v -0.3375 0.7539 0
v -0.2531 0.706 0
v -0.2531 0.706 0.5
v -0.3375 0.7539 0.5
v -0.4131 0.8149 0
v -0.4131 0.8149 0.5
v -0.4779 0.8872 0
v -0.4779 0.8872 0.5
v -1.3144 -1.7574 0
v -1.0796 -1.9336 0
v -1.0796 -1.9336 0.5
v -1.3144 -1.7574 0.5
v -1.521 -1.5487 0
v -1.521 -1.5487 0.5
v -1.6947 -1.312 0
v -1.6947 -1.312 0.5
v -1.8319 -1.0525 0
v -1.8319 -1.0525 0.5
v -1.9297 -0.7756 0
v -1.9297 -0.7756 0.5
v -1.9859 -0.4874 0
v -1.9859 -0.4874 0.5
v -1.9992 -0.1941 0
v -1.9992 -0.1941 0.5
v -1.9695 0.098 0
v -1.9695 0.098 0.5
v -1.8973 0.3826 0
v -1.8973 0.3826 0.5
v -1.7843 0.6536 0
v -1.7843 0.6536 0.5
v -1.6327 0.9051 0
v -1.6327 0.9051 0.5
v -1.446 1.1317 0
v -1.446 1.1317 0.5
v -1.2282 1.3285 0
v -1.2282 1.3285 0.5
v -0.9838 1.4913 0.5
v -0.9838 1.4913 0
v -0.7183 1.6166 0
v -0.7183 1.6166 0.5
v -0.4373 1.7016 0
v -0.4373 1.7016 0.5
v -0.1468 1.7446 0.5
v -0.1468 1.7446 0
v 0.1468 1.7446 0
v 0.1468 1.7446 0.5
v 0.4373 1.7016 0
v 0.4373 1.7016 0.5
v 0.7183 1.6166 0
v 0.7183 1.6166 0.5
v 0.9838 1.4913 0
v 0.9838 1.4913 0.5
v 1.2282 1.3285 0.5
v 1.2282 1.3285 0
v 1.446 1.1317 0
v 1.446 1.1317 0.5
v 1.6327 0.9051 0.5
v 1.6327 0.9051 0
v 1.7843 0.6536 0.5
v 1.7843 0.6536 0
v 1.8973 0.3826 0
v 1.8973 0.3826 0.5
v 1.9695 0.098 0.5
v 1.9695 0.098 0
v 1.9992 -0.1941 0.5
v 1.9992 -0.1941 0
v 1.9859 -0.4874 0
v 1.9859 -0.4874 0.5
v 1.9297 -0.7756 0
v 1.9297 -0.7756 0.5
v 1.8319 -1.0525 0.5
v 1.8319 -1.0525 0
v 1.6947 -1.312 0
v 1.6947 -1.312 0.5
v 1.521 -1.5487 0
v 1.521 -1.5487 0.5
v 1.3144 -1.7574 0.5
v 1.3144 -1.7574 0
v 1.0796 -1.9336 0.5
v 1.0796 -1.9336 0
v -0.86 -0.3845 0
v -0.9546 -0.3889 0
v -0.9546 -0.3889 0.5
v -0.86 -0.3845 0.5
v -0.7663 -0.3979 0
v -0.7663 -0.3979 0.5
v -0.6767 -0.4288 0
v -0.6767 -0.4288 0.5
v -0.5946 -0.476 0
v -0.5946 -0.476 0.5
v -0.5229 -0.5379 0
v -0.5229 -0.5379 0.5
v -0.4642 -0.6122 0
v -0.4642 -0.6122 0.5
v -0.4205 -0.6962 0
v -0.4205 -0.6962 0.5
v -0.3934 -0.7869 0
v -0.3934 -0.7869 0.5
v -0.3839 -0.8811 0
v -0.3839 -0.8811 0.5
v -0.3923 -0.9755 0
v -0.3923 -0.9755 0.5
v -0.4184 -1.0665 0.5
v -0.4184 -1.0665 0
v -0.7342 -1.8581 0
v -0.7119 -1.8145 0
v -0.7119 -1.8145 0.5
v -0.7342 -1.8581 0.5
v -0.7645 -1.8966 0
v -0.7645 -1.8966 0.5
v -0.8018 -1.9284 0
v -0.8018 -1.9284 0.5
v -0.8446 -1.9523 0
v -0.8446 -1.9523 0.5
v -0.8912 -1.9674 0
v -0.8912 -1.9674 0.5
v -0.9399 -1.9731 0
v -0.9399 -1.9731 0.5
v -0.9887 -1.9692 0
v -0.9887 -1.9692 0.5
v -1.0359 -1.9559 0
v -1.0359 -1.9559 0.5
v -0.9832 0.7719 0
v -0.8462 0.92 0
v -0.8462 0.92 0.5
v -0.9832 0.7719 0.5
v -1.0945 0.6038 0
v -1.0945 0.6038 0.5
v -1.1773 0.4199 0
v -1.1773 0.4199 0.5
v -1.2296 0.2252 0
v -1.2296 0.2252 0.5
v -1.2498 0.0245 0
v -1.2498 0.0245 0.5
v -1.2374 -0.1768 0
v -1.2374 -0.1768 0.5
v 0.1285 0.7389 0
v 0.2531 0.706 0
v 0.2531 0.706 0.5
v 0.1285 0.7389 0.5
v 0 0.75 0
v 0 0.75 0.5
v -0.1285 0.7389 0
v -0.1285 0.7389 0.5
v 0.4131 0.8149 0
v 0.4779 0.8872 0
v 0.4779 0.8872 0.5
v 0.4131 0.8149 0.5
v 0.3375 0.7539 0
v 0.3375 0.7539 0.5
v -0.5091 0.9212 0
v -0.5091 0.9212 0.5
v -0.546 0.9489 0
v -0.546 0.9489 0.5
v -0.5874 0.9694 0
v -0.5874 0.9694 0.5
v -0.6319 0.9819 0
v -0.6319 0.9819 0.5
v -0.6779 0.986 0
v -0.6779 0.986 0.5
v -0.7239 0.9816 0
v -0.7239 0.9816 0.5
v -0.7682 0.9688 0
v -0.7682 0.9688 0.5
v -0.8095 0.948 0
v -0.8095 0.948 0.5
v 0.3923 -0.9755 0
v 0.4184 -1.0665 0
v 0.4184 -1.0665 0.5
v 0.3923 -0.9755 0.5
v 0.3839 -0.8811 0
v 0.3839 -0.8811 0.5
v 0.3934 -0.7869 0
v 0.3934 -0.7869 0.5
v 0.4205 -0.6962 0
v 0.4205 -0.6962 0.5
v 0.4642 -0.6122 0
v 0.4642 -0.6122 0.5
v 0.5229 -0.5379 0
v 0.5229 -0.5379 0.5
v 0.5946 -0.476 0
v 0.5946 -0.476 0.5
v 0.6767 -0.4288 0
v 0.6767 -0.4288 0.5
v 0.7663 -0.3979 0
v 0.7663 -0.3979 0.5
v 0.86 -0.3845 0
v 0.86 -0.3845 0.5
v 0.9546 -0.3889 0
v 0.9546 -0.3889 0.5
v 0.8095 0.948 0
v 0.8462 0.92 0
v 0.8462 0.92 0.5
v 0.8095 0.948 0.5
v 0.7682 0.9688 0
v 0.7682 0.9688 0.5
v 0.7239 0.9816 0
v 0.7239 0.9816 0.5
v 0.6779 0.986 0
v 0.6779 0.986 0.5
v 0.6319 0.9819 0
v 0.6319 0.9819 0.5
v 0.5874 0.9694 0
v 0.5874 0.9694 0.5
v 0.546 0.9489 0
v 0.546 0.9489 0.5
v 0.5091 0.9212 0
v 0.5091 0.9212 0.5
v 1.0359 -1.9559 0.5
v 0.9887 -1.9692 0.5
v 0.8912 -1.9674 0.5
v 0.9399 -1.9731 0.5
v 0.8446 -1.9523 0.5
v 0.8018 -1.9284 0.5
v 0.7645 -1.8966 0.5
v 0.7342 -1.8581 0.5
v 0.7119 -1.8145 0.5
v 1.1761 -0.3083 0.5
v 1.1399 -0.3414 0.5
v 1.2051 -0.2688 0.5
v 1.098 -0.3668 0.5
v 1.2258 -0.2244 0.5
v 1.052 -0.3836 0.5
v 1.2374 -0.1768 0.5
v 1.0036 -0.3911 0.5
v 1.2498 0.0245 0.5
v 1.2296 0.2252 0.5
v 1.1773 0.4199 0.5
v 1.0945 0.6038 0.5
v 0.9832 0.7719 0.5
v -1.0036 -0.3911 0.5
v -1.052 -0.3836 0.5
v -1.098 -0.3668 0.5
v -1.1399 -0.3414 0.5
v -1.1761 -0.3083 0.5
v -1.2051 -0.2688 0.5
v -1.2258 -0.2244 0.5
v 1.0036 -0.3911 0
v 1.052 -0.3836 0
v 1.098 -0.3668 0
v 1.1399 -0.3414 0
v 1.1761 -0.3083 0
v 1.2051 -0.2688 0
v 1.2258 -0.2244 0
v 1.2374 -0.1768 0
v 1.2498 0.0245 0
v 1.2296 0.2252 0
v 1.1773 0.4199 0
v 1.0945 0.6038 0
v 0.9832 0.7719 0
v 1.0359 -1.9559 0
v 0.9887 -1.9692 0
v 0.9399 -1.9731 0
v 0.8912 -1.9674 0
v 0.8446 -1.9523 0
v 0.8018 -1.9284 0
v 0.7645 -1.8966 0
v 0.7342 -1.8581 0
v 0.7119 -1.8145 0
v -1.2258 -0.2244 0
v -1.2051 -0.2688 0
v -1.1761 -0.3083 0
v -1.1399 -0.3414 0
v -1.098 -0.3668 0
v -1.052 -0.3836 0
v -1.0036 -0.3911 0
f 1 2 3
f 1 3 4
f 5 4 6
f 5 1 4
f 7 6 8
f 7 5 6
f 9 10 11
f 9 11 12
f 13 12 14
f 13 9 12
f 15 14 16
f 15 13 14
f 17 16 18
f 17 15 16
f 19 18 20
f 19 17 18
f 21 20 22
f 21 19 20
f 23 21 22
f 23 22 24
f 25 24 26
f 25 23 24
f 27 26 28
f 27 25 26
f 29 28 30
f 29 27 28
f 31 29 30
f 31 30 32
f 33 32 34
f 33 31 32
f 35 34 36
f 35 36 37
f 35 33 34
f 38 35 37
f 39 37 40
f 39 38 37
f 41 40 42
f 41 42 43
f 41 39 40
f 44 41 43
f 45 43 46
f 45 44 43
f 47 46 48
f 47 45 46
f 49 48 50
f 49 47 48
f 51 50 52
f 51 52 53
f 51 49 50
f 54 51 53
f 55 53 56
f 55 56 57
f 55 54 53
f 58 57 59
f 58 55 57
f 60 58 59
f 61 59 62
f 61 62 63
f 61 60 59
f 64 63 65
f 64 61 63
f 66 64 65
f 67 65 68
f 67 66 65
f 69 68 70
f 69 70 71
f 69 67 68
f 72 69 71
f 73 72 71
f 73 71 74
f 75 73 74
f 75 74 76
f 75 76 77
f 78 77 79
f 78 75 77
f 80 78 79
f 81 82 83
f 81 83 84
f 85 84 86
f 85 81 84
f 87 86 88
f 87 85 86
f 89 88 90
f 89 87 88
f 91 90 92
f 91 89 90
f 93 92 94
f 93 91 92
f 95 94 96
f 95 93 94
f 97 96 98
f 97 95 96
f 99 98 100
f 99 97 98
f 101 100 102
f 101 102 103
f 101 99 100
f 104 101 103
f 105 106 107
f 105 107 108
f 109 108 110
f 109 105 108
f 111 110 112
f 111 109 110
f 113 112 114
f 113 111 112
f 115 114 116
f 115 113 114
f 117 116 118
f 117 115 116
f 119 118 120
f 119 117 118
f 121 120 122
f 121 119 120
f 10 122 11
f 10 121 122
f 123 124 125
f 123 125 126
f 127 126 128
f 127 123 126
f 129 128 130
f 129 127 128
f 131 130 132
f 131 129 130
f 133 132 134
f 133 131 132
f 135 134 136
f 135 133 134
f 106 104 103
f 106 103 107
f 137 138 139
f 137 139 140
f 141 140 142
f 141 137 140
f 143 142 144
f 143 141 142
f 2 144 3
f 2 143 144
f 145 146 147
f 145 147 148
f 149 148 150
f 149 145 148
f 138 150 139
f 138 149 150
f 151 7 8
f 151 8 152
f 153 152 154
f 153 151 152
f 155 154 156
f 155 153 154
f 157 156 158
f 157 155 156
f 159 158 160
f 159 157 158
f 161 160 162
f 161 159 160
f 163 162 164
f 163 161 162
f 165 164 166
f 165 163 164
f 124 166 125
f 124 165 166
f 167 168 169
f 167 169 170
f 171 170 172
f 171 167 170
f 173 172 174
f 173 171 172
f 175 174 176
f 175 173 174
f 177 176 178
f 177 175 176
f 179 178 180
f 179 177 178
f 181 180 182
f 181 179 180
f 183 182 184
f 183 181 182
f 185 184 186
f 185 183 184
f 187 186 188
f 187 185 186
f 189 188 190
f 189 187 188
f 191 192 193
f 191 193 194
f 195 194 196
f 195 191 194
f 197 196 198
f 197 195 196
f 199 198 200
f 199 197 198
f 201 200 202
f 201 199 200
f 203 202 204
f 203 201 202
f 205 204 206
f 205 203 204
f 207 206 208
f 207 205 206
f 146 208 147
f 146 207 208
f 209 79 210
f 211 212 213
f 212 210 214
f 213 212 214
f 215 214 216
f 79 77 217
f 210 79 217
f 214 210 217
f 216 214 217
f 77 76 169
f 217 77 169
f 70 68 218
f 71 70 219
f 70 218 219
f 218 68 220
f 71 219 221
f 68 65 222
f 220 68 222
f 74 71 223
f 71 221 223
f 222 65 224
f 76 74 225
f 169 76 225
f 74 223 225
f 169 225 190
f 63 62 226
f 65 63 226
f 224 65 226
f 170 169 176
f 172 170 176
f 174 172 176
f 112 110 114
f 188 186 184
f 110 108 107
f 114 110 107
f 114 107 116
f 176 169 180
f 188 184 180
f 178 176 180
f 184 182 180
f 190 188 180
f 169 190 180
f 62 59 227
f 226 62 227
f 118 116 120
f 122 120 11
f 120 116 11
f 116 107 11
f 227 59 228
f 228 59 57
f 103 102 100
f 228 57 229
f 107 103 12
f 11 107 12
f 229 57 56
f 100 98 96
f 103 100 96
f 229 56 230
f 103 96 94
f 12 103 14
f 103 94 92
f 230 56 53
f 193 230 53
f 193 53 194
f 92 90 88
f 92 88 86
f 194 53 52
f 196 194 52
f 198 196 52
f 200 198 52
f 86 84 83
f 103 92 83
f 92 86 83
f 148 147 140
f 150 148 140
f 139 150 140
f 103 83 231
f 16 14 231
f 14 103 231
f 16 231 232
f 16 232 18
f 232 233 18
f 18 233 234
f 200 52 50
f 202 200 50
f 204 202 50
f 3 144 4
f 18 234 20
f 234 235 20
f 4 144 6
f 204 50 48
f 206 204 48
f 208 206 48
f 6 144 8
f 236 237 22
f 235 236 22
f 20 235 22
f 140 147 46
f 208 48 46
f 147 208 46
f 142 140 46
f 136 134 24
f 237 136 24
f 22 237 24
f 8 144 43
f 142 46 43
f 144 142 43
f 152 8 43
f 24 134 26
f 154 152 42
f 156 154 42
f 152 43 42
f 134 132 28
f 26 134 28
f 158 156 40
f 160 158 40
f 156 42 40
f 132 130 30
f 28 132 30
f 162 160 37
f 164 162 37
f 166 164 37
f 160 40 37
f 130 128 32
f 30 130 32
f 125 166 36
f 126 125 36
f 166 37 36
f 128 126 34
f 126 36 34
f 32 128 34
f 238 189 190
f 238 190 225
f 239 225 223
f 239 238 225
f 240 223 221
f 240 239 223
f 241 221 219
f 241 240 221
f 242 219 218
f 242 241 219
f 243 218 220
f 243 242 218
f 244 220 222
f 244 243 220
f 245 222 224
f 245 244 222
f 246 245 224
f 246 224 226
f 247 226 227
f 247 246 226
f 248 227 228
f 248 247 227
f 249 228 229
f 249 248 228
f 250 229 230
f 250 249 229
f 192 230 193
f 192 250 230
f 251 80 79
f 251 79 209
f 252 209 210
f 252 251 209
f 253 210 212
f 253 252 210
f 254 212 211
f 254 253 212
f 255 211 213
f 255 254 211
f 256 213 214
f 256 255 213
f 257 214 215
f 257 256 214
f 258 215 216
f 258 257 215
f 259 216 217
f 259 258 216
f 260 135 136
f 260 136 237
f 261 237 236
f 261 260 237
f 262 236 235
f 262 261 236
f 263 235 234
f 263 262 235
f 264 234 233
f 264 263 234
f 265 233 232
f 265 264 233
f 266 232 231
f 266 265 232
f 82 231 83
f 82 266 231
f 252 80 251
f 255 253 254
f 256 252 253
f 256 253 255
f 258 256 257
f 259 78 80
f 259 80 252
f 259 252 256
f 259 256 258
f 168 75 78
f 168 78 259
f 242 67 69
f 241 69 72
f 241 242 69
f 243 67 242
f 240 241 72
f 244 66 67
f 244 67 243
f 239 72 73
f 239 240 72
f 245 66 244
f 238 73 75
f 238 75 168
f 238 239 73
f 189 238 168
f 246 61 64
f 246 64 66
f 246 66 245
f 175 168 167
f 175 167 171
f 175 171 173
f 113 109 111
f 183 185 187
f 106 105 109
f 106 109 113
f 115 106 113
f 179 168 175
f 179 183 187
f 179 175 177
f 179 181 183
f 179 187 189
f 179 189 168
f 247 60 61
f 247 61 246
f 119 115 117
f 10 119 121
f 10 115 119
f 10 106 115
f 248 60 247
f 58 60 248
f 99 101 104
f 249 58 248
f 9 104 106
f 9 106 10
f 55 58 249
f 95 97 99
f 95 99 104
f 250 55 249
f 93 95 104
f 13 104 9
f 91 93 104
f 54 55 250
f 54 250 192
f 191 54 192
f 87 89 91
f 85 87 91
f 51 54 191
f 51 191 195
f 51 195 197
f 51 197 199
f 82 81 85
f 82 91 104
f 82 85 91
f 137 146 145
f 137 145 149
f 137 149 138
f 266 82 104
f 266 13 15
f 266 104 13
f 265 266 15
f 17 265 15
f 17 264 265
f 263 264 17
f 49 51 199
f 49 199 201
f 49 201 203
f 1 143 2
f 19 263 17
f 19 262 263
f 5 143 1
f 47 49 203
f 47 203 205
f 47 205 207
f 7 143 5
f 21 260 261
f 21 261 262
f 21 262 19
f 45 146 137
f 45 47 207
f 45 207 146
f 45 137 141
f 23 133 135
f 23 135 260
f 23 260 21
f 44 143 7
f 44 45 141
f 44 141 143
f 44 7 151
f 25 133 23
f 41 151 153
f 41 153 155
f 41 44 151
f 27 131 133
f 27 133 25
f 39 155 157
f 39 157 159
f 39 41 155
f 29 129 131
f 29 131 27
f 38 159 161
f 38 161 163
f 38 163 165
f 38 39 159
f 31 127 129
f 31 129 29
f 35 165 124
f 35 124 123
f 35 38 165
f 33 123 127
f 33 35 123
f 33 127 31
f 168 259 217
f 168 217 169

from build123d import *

# Parameters (mm, degrees)
BOSS_EXTRU_1_DEPTH = 0.5


with BuildPart() as part:
    # Esquisse1 → Boss.-Extru.1 (new body)
    with BuildSketch(Plane.XY):
        with BuildLine():
            Line((-0.418425085, -1.066499155), (-0.711880974, -1.814471655))
            ThreePointArc((-0.711880974, -1.814471655), (-0.867543301, -1.960988747), (-1.079554479, -1.933615789))
            ThreePointArc((-1.079554479, -1.933615789), (0, 1.75), (1.079554479, -1.933615789))
            ThreePointArc((1.079554479, -1.933615789), (0.867543301, -1.960988747), (0.711880974, -1.814471655))
            Line((0.711880974, -1.814471655), (0.418425085, -1.066499155))
            ThreePointArc((0.418425085, -1.066499155), (0.49178829, -0.57362332), (0.954594155, -0.38890873))
            ThreePointArc((0.954594155, -0.38890873), (1.139949494, -0.341421356), (1.237436867, -0.176776695))
            ThreePointArc((1.237436867, -0.176776695), (1.177345945, 0.419948242), (0.84622692, 0.92))
            ThreePointArc((0.84622692, 0.92), (0.654792508, 0.985013347), (0.477869319, 0.887176471))
            ThreePointArc((0.477869319, 0.887176471), (0.376548051, 0.782868792), (0.253108672, 0.706))
            ThreePointArc((0.253108672, 0.706), (0, 0.75), (-0.253108672, 0.706))
            ThreePointArc((-0.253108672, 0.706), (-0.376548051, 0.782868792), (-0.477869319, 0.887176471))
            ThreePointArc((-0.477869319, 0.887176471), (-0.654792508, 0.985013347), (-0.84622692, 0.92))
            ThreePointArc((-0.84622692, 0.92), (-1.177345945, 0.419948242), (-1.237436867, -0.176776695))
            ThreePointArc((-1.237436867, -0.176776695), (-1.139949494, -0.341421356), (-0.954594155, -0.38890873))
            ThreePointArc((-0.954594155, -0.38890873), (-0.49178829, -0.57362332), (-0.418425085, -1.066499155))
        make_face()
    extrude(amount=BOSS_EXTRU_1_DEPTH)


solid = part.part
